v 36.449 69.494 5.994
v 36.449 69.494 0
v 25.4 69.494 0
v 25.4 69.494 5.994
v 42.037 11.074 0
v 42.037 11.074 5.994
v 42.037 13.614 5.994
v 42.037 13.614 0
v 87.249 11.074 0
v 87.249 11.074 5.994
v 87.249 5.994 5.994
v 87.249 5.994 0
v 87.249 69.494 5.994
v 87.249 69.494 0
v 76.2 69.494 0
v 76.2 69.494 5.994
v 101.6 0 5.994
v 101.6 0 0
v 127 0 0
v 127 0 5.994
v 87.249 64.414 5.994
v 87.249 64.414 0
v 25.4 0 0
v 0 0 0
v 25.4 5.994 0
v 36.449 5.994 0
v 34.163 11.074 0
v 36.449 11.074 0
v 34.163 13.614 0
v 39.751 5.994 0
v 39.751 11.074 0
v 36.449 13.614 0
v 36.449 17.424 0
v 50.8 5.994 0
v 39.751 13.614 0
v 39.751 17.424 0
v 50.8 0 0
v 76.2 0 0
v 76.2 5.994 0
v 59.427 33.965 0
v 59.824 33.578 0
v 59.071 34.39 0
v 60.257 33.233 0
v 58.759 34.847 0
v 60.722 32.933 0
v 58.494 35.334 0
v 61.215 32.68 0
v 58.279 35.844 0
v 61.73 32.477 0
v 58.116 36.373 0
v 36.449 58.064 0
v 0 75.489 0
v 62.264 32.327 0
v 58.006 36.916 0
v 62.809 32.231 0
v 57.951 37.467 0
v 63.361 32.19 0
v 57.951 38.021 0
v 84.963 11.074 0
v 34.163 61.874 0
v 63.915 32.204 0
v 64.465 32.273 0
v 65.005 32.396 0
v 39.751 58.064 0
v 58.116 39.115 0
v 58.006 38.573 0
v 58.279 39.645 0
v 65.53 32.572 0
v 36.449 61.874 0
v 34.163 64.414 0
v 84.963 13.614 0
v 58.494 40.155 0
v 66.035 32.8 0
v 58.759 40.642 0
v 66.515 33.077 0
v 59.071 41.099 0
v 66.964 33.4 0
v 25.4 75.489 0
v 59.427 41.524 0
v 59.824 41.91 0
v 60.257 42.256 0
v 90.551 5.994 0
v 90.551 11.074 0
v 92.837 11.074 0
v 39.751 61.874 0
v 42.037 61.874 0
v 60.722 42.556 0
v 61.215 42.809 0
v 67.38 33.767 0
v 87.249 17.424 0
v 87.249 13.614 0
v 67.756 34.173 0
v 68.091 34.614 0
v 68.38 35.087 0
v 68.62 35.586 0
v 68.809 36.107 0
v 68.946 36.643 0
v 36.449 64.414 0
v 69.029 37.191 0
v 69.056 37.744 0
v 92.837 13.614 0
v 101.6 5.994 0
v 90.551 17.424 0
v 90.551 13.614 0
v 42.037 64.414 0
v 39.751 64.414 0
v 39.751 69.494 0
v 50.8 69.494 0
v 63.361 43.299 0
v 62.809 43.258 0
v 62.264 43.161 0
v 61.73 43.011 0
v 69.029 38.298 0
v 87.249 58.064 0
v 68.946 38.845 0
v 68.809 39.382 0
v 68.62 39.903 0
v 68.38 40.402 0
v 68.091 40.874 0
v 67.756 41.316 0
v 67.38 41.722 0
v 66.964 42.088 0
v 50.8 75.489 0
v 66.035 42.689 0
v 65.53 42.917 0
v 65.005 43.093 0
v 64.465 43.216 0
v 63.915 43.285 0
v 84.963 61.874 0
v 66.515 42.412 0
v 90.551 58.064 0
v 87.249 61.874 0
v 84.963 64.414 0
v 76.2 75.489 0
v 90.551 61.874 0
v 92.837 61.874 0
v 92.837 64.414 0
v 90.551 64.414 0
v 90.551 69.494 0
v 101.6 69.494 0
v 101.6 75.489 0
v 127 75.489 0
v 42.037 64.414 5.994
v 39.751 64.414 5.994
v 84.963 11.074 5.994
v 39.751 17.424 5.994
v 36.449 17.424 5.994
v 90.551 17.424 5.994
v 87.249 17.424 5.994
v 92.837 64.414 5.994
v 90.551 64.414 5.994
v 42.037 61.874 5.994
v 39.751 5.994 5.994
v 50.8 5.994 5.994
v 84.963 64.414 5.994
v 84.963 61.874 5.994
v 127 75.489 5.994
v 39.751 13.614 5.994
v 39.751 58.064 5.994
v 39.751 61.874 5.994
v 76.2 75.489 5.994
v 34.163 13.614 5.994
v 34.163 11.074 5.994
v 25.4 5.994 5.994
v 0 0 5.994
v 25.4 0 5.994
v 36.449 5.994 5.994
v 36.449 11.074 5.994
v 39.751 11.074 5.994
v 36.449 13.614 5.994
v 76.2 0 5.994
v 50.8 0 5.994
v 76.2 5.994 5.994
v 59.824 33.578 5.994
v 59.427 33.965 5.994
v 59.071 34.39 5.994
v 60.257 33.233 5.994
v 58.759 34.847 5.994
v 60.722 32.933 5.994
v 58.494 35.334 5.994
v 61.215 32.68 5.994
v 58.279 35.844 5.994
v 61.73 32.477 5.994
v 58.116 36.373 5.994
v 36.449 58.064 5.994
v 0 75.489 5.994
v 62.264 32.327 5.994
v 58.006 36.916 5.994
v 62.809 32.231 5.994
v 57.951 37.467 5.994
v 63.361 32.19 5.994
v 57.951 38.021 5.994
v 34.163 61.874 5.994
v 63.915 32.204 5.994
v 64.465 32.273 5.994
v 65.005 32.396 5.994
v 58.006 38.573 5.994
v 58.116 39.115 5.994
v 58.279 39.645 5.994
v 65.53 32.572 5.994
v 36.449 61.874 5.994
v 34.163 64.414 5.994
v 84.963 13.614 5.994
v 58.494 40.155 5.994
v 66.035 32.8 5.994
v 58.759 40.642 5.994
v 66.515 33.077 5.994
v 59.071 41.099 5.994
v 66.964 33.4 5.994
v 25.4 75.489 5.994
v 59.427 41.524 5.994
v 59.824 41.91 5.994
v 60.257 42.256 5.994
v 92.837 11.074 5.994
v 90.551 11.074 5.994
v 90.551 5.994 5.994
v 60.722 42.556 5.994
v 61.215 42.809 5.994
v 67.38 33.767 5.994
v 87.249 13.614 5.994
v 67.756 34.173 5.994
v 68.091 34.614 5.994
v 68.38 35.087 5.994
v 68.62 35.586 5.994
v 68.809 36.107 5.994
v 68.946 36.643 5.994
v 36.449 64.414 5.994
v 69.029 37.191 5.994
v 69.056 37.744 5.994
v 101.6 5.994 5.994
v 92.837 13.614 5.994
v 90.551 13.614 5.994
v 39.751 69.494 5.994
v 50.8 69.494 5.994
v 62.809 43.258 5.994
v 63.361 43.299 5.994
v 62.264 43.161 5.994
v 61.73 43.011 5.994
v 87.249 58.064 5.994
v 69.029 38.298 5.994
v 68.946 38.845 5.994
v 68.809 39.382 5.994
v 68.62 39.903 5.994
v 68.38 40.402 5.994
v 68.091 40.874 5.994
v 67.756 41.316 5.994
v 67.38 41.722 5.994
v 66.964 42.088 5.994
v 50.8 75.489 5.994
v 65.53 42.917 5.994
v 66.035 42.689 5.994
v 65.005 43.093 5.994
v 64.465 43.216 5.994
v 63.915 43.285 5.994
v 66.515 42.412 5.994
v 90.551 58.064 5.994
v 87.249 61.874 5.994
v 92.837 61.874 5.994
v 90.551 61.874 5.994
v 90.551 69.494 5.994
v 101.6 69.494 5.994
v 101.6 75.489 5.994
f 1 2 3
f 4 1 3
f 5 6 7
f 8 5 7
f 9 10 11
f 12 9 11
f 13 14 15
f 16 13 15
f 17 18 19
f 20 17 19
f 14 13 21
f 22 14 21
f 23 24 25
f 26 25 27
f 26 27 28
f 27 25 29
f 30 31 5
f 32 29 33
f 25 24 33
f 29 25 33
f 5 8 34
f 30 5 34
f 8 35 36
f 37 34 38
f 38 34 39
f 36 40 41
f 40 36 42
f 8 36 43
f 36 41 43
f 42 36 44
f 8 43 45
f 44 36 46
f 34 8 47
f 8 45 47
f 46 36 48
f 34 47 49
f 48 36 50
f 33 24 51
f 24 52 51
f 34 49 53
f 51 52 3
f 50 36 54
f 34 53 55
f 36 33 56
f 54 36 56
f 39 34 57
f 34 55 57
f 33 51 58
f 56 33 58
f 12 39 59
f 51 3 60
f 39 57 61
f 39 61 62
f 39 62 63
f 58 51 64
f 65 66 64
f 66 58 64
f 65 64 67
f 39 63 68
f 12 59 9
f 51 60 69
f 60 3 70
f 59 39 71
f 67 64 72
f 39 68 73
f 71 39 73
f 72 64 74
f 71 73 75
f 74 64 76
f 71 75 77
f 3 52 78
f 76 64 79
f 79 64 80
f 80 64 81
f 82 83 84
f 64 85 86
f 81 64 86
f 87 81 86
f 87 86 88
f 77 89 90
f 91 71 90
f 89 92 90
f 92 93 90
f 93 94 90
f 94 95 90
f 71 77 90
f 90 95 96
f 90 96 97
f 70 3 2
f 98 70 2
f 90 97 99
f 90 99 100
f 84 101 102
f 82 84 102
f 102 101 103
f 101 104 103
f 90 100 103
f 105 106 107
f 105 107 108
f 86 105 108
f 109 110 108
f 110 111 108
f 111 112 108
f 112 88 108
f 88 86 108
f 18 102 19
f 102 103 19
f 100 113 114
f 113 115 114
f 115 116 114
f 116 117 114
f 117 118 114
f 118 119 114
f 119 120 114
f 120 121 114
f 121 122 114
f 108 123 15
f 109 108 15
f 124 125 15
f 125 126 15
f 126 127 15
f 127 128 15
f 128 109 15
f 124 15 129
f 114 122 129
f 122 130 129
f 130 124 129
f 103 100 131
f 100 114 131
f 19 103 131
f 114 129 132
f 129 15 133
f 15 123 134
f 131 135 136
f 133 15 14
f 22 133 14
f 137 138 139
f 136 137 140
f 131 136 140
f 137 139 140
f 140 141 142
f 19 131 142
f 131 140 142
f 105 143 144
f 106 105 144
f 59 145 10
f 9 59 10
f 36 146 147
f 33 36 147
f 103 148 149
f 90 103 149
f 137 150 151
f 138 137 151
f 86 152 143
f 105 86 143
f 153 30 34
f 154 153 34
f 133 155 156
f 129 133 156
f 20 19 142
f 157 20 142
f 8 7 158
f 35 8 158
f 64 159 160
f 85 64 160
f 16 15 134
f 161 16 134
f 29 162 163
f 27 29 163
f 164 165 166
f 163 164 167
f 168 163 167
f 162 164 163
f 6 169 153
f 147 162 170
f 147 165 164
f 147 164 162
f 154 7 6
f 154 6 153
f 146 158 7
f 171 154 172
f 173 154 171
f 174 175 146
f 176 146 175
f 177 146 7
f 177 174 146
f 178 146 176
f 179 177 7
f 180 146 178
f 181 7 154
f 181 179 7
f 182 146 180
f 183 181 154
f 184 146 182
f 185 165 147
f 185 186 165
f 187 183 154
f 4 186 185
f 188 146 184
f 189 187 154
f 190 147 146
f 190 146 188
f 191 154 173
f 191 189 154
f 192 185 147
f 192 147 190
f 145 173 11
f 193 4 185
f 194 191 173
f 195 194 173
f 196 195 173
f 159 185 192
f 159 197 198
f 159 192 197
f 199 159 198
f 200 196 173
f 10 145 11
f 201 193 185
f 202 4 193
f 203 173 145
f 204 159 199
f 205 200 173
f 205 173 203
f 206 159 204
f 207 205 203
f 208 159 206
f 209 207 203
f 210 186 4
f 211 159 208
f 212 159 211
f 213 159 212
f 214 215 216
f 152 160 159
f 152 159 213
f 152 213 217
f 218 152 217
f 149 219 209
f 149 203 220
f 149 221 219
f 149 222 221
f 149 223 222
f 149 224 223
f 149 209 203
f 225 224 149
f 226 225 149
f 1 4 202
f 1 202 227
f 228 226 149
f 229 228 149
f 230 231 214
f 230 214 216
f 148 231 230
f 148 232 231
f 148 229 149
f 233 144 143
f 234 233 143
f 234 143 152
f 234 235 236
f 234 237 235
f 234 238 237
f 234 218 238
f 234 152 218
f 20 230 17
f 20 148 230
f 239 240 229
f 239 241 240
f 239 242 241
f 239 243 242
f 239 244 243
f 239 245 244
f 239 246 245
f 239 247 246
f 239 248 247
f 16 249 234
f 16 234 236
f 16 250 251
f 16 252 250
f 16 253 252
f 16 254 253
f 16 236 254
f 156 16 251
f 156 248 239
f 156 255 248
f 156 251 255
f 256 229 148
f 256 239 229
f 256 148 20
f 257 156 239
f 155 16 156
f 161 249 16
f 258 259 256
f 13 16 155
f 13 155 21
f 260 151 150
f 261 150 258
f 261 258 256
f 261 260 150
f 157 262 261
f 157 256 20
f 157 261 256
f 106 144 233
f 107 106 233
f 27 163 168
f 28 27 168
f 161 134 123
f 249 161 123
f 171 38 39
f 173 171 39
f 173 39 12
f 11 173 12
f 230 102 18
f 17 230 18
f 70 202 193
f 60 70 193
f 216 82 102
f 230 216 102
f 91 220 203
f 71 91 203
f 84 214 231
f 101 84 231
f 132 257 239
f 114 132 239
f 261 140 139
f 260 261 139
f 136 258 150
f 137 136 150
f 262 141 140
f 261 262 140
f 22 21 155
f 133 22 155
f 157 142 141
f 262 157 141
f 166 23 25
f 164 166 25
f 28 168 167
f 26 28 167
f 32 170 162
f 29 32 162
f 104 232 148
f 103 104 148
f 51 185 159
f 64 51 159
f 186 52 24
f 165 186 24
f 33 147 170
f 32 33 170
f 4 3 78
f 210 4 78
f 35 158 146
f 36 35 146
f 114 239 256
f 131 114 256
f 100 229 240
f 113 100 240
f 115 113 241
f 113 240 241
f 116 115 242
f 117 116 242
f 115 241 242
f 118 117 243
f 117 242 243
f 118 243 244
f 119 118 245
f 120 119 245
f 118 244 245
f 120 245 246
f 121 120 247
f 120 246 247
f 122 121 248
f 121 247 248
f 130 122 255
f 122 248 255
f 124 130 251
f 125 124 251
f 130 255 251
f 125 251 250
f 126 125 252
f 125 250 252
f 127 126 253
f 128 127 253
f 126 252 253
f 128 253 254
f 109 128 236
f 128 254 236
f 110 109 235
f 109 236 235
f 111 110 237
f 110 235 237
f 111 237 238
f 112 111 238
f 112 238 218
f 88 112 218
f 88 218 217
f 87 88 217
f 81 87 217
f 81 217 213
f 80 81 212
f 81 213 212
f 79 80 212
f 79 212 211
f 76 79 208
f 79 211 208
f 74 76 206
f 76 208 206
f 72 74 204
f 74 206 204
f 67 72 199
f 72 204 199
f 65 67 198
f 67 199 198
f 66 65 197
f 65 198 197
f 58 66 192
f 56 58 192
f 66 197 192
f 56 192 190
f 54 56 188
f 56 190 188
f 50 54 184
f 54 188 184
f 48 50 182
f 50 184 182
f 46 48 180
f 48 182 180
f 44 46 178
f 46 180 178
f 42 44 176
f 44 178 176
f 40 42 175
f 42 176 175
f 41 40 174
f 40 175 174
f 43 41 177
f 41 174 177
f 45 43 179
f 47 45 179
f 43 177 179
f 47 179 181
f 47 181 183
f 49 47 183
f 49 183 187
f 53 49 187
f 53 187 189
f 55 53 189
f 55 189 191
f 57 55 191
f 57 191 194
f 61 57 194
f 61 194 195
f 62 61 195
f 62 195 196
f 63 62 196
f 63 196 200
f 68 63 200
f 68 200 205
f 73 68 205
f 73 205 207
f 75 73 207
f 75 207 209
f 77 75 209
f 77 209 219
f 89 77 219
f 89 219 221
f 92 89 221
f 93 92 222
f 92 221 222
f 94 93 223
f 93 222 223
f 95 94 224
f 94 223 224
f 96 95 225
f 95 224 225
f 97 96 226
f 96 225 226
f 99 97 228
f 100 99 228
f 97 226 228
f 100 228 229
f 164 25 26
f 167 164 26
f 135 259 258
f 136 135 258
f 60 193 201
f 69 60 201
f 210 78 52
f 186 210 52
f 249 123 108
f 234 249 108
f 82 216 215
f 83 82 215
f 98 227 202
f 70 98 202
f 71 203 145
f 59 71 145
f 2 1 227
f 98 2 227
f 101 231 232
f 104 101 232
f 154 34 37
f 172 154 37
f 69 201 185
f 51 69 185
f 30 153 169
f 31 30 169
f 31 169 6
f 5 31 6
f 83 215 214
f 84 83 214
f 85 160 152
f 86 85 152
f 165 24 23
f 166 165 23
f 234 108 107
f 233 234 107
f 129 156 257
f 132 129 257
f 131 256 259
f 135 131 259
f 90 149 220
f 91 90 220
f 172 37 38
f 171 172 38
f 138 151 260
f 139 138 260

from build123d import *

# Parameters (mm, degrees)
BOSS_EXTRUDE1_DEPTH = 5.9944
CUT_EXTRUDE2_DEPTH  = 5.9944
SKETCH3_R           = 5.55625
CUT_EXTRUDE3_DEPTH  = 5.9944


with BuildPart() as part:
    # Sketch1 → Boss-Extrude1 (new body)
    with BuildSketch(Plane.XY):
        Polygon((25.4, 5.9944), (50.8, 5.9944), (50.8, 0), (76.2, 0), (76.2, 5.9944), (101.6, 5.9944), (101.6, 0), (127, 0), (127, 75.4888), (101.6, 75.4888), (101.6, 69.4944), (76.2, 69.4944), (76.2, 75.4888), (50.8, 75.4888), (50.8, 69.4944), (25.4, 69.4944), (25.4, 75.4888), (0, 75.4888), (0, 0), (25.4, 0), align=None)
    extrude(amount=BOSS_EXTRUDE1_DEPTH)

    # Sketch2 → Cut-Extrude2 (cut)
    with BuildSketch(Plane.XY.offset(5.9944)):
        Polygon((36.449, 69.4944), (36.449, 64.4144), (34.163, 64.4144), (34.163, 61.8744), (36.449, 61.8744), (36.449, 58.0644), (39.751, 58.0644), (39.751, 61.8744), (42.037, 61.8744), (42.037, 64.4144), (39.751, 64.4144), (39.751, 69.4944), align=None)
        Polygon((36.449, 5.9944), (39.751, 5.9944), (39.751, 11.0744), (42.037, 11.0744), (42.037, 13.6144), (39.751, 13.6144), (39.751, 17.4244), (36.449, 17.4244), (36.449, 13.6144), (34.163, 13.6144), (34.163, 11.0744), (36.449, 11.0744), align=None)
        Polygon((90.551, 5.9944), (90.551, 11.0744), (92.837, 11.0744), (92.837, 13.6144), (90.551, 13.6144), (90.551, 17.4244), (87.249, 17.4244), (87.249, 13.6144), (84.963, 13.6144), (84.963, 11.0744), (87.249, 11.0744), (87.249, 5.9944), align=None)
        Polygon((90.551, 69.4944), (87.249, 69.4944), (87.249, 64.4144), (84.963, 64.4144), (84.963, 61.8744), (87.249, 61.8744), (87.249, 58.0644), (90.551, 58.0644), (90.551, 61.8744), (92.837, 61.8744), (92.837, 64.4144), (90.551, 64.4144), align=None)
    extrude(amount=-CUT_EXTRUDE2_DEPTH, mode=Mode.SUBTRACT)

    # Sketch3 → Cut-Extrude3 (cut)
    with BuildSketch(Plane.XY.offset(5.9944)):
        with Locations((63.5, 37.7444)):
            Circle(SKETCH3_R)
    extrude(amount=-CUT_EXTRUDE3_DEPTH, mode=Mode.SUBTRACT)


solid = part.part
